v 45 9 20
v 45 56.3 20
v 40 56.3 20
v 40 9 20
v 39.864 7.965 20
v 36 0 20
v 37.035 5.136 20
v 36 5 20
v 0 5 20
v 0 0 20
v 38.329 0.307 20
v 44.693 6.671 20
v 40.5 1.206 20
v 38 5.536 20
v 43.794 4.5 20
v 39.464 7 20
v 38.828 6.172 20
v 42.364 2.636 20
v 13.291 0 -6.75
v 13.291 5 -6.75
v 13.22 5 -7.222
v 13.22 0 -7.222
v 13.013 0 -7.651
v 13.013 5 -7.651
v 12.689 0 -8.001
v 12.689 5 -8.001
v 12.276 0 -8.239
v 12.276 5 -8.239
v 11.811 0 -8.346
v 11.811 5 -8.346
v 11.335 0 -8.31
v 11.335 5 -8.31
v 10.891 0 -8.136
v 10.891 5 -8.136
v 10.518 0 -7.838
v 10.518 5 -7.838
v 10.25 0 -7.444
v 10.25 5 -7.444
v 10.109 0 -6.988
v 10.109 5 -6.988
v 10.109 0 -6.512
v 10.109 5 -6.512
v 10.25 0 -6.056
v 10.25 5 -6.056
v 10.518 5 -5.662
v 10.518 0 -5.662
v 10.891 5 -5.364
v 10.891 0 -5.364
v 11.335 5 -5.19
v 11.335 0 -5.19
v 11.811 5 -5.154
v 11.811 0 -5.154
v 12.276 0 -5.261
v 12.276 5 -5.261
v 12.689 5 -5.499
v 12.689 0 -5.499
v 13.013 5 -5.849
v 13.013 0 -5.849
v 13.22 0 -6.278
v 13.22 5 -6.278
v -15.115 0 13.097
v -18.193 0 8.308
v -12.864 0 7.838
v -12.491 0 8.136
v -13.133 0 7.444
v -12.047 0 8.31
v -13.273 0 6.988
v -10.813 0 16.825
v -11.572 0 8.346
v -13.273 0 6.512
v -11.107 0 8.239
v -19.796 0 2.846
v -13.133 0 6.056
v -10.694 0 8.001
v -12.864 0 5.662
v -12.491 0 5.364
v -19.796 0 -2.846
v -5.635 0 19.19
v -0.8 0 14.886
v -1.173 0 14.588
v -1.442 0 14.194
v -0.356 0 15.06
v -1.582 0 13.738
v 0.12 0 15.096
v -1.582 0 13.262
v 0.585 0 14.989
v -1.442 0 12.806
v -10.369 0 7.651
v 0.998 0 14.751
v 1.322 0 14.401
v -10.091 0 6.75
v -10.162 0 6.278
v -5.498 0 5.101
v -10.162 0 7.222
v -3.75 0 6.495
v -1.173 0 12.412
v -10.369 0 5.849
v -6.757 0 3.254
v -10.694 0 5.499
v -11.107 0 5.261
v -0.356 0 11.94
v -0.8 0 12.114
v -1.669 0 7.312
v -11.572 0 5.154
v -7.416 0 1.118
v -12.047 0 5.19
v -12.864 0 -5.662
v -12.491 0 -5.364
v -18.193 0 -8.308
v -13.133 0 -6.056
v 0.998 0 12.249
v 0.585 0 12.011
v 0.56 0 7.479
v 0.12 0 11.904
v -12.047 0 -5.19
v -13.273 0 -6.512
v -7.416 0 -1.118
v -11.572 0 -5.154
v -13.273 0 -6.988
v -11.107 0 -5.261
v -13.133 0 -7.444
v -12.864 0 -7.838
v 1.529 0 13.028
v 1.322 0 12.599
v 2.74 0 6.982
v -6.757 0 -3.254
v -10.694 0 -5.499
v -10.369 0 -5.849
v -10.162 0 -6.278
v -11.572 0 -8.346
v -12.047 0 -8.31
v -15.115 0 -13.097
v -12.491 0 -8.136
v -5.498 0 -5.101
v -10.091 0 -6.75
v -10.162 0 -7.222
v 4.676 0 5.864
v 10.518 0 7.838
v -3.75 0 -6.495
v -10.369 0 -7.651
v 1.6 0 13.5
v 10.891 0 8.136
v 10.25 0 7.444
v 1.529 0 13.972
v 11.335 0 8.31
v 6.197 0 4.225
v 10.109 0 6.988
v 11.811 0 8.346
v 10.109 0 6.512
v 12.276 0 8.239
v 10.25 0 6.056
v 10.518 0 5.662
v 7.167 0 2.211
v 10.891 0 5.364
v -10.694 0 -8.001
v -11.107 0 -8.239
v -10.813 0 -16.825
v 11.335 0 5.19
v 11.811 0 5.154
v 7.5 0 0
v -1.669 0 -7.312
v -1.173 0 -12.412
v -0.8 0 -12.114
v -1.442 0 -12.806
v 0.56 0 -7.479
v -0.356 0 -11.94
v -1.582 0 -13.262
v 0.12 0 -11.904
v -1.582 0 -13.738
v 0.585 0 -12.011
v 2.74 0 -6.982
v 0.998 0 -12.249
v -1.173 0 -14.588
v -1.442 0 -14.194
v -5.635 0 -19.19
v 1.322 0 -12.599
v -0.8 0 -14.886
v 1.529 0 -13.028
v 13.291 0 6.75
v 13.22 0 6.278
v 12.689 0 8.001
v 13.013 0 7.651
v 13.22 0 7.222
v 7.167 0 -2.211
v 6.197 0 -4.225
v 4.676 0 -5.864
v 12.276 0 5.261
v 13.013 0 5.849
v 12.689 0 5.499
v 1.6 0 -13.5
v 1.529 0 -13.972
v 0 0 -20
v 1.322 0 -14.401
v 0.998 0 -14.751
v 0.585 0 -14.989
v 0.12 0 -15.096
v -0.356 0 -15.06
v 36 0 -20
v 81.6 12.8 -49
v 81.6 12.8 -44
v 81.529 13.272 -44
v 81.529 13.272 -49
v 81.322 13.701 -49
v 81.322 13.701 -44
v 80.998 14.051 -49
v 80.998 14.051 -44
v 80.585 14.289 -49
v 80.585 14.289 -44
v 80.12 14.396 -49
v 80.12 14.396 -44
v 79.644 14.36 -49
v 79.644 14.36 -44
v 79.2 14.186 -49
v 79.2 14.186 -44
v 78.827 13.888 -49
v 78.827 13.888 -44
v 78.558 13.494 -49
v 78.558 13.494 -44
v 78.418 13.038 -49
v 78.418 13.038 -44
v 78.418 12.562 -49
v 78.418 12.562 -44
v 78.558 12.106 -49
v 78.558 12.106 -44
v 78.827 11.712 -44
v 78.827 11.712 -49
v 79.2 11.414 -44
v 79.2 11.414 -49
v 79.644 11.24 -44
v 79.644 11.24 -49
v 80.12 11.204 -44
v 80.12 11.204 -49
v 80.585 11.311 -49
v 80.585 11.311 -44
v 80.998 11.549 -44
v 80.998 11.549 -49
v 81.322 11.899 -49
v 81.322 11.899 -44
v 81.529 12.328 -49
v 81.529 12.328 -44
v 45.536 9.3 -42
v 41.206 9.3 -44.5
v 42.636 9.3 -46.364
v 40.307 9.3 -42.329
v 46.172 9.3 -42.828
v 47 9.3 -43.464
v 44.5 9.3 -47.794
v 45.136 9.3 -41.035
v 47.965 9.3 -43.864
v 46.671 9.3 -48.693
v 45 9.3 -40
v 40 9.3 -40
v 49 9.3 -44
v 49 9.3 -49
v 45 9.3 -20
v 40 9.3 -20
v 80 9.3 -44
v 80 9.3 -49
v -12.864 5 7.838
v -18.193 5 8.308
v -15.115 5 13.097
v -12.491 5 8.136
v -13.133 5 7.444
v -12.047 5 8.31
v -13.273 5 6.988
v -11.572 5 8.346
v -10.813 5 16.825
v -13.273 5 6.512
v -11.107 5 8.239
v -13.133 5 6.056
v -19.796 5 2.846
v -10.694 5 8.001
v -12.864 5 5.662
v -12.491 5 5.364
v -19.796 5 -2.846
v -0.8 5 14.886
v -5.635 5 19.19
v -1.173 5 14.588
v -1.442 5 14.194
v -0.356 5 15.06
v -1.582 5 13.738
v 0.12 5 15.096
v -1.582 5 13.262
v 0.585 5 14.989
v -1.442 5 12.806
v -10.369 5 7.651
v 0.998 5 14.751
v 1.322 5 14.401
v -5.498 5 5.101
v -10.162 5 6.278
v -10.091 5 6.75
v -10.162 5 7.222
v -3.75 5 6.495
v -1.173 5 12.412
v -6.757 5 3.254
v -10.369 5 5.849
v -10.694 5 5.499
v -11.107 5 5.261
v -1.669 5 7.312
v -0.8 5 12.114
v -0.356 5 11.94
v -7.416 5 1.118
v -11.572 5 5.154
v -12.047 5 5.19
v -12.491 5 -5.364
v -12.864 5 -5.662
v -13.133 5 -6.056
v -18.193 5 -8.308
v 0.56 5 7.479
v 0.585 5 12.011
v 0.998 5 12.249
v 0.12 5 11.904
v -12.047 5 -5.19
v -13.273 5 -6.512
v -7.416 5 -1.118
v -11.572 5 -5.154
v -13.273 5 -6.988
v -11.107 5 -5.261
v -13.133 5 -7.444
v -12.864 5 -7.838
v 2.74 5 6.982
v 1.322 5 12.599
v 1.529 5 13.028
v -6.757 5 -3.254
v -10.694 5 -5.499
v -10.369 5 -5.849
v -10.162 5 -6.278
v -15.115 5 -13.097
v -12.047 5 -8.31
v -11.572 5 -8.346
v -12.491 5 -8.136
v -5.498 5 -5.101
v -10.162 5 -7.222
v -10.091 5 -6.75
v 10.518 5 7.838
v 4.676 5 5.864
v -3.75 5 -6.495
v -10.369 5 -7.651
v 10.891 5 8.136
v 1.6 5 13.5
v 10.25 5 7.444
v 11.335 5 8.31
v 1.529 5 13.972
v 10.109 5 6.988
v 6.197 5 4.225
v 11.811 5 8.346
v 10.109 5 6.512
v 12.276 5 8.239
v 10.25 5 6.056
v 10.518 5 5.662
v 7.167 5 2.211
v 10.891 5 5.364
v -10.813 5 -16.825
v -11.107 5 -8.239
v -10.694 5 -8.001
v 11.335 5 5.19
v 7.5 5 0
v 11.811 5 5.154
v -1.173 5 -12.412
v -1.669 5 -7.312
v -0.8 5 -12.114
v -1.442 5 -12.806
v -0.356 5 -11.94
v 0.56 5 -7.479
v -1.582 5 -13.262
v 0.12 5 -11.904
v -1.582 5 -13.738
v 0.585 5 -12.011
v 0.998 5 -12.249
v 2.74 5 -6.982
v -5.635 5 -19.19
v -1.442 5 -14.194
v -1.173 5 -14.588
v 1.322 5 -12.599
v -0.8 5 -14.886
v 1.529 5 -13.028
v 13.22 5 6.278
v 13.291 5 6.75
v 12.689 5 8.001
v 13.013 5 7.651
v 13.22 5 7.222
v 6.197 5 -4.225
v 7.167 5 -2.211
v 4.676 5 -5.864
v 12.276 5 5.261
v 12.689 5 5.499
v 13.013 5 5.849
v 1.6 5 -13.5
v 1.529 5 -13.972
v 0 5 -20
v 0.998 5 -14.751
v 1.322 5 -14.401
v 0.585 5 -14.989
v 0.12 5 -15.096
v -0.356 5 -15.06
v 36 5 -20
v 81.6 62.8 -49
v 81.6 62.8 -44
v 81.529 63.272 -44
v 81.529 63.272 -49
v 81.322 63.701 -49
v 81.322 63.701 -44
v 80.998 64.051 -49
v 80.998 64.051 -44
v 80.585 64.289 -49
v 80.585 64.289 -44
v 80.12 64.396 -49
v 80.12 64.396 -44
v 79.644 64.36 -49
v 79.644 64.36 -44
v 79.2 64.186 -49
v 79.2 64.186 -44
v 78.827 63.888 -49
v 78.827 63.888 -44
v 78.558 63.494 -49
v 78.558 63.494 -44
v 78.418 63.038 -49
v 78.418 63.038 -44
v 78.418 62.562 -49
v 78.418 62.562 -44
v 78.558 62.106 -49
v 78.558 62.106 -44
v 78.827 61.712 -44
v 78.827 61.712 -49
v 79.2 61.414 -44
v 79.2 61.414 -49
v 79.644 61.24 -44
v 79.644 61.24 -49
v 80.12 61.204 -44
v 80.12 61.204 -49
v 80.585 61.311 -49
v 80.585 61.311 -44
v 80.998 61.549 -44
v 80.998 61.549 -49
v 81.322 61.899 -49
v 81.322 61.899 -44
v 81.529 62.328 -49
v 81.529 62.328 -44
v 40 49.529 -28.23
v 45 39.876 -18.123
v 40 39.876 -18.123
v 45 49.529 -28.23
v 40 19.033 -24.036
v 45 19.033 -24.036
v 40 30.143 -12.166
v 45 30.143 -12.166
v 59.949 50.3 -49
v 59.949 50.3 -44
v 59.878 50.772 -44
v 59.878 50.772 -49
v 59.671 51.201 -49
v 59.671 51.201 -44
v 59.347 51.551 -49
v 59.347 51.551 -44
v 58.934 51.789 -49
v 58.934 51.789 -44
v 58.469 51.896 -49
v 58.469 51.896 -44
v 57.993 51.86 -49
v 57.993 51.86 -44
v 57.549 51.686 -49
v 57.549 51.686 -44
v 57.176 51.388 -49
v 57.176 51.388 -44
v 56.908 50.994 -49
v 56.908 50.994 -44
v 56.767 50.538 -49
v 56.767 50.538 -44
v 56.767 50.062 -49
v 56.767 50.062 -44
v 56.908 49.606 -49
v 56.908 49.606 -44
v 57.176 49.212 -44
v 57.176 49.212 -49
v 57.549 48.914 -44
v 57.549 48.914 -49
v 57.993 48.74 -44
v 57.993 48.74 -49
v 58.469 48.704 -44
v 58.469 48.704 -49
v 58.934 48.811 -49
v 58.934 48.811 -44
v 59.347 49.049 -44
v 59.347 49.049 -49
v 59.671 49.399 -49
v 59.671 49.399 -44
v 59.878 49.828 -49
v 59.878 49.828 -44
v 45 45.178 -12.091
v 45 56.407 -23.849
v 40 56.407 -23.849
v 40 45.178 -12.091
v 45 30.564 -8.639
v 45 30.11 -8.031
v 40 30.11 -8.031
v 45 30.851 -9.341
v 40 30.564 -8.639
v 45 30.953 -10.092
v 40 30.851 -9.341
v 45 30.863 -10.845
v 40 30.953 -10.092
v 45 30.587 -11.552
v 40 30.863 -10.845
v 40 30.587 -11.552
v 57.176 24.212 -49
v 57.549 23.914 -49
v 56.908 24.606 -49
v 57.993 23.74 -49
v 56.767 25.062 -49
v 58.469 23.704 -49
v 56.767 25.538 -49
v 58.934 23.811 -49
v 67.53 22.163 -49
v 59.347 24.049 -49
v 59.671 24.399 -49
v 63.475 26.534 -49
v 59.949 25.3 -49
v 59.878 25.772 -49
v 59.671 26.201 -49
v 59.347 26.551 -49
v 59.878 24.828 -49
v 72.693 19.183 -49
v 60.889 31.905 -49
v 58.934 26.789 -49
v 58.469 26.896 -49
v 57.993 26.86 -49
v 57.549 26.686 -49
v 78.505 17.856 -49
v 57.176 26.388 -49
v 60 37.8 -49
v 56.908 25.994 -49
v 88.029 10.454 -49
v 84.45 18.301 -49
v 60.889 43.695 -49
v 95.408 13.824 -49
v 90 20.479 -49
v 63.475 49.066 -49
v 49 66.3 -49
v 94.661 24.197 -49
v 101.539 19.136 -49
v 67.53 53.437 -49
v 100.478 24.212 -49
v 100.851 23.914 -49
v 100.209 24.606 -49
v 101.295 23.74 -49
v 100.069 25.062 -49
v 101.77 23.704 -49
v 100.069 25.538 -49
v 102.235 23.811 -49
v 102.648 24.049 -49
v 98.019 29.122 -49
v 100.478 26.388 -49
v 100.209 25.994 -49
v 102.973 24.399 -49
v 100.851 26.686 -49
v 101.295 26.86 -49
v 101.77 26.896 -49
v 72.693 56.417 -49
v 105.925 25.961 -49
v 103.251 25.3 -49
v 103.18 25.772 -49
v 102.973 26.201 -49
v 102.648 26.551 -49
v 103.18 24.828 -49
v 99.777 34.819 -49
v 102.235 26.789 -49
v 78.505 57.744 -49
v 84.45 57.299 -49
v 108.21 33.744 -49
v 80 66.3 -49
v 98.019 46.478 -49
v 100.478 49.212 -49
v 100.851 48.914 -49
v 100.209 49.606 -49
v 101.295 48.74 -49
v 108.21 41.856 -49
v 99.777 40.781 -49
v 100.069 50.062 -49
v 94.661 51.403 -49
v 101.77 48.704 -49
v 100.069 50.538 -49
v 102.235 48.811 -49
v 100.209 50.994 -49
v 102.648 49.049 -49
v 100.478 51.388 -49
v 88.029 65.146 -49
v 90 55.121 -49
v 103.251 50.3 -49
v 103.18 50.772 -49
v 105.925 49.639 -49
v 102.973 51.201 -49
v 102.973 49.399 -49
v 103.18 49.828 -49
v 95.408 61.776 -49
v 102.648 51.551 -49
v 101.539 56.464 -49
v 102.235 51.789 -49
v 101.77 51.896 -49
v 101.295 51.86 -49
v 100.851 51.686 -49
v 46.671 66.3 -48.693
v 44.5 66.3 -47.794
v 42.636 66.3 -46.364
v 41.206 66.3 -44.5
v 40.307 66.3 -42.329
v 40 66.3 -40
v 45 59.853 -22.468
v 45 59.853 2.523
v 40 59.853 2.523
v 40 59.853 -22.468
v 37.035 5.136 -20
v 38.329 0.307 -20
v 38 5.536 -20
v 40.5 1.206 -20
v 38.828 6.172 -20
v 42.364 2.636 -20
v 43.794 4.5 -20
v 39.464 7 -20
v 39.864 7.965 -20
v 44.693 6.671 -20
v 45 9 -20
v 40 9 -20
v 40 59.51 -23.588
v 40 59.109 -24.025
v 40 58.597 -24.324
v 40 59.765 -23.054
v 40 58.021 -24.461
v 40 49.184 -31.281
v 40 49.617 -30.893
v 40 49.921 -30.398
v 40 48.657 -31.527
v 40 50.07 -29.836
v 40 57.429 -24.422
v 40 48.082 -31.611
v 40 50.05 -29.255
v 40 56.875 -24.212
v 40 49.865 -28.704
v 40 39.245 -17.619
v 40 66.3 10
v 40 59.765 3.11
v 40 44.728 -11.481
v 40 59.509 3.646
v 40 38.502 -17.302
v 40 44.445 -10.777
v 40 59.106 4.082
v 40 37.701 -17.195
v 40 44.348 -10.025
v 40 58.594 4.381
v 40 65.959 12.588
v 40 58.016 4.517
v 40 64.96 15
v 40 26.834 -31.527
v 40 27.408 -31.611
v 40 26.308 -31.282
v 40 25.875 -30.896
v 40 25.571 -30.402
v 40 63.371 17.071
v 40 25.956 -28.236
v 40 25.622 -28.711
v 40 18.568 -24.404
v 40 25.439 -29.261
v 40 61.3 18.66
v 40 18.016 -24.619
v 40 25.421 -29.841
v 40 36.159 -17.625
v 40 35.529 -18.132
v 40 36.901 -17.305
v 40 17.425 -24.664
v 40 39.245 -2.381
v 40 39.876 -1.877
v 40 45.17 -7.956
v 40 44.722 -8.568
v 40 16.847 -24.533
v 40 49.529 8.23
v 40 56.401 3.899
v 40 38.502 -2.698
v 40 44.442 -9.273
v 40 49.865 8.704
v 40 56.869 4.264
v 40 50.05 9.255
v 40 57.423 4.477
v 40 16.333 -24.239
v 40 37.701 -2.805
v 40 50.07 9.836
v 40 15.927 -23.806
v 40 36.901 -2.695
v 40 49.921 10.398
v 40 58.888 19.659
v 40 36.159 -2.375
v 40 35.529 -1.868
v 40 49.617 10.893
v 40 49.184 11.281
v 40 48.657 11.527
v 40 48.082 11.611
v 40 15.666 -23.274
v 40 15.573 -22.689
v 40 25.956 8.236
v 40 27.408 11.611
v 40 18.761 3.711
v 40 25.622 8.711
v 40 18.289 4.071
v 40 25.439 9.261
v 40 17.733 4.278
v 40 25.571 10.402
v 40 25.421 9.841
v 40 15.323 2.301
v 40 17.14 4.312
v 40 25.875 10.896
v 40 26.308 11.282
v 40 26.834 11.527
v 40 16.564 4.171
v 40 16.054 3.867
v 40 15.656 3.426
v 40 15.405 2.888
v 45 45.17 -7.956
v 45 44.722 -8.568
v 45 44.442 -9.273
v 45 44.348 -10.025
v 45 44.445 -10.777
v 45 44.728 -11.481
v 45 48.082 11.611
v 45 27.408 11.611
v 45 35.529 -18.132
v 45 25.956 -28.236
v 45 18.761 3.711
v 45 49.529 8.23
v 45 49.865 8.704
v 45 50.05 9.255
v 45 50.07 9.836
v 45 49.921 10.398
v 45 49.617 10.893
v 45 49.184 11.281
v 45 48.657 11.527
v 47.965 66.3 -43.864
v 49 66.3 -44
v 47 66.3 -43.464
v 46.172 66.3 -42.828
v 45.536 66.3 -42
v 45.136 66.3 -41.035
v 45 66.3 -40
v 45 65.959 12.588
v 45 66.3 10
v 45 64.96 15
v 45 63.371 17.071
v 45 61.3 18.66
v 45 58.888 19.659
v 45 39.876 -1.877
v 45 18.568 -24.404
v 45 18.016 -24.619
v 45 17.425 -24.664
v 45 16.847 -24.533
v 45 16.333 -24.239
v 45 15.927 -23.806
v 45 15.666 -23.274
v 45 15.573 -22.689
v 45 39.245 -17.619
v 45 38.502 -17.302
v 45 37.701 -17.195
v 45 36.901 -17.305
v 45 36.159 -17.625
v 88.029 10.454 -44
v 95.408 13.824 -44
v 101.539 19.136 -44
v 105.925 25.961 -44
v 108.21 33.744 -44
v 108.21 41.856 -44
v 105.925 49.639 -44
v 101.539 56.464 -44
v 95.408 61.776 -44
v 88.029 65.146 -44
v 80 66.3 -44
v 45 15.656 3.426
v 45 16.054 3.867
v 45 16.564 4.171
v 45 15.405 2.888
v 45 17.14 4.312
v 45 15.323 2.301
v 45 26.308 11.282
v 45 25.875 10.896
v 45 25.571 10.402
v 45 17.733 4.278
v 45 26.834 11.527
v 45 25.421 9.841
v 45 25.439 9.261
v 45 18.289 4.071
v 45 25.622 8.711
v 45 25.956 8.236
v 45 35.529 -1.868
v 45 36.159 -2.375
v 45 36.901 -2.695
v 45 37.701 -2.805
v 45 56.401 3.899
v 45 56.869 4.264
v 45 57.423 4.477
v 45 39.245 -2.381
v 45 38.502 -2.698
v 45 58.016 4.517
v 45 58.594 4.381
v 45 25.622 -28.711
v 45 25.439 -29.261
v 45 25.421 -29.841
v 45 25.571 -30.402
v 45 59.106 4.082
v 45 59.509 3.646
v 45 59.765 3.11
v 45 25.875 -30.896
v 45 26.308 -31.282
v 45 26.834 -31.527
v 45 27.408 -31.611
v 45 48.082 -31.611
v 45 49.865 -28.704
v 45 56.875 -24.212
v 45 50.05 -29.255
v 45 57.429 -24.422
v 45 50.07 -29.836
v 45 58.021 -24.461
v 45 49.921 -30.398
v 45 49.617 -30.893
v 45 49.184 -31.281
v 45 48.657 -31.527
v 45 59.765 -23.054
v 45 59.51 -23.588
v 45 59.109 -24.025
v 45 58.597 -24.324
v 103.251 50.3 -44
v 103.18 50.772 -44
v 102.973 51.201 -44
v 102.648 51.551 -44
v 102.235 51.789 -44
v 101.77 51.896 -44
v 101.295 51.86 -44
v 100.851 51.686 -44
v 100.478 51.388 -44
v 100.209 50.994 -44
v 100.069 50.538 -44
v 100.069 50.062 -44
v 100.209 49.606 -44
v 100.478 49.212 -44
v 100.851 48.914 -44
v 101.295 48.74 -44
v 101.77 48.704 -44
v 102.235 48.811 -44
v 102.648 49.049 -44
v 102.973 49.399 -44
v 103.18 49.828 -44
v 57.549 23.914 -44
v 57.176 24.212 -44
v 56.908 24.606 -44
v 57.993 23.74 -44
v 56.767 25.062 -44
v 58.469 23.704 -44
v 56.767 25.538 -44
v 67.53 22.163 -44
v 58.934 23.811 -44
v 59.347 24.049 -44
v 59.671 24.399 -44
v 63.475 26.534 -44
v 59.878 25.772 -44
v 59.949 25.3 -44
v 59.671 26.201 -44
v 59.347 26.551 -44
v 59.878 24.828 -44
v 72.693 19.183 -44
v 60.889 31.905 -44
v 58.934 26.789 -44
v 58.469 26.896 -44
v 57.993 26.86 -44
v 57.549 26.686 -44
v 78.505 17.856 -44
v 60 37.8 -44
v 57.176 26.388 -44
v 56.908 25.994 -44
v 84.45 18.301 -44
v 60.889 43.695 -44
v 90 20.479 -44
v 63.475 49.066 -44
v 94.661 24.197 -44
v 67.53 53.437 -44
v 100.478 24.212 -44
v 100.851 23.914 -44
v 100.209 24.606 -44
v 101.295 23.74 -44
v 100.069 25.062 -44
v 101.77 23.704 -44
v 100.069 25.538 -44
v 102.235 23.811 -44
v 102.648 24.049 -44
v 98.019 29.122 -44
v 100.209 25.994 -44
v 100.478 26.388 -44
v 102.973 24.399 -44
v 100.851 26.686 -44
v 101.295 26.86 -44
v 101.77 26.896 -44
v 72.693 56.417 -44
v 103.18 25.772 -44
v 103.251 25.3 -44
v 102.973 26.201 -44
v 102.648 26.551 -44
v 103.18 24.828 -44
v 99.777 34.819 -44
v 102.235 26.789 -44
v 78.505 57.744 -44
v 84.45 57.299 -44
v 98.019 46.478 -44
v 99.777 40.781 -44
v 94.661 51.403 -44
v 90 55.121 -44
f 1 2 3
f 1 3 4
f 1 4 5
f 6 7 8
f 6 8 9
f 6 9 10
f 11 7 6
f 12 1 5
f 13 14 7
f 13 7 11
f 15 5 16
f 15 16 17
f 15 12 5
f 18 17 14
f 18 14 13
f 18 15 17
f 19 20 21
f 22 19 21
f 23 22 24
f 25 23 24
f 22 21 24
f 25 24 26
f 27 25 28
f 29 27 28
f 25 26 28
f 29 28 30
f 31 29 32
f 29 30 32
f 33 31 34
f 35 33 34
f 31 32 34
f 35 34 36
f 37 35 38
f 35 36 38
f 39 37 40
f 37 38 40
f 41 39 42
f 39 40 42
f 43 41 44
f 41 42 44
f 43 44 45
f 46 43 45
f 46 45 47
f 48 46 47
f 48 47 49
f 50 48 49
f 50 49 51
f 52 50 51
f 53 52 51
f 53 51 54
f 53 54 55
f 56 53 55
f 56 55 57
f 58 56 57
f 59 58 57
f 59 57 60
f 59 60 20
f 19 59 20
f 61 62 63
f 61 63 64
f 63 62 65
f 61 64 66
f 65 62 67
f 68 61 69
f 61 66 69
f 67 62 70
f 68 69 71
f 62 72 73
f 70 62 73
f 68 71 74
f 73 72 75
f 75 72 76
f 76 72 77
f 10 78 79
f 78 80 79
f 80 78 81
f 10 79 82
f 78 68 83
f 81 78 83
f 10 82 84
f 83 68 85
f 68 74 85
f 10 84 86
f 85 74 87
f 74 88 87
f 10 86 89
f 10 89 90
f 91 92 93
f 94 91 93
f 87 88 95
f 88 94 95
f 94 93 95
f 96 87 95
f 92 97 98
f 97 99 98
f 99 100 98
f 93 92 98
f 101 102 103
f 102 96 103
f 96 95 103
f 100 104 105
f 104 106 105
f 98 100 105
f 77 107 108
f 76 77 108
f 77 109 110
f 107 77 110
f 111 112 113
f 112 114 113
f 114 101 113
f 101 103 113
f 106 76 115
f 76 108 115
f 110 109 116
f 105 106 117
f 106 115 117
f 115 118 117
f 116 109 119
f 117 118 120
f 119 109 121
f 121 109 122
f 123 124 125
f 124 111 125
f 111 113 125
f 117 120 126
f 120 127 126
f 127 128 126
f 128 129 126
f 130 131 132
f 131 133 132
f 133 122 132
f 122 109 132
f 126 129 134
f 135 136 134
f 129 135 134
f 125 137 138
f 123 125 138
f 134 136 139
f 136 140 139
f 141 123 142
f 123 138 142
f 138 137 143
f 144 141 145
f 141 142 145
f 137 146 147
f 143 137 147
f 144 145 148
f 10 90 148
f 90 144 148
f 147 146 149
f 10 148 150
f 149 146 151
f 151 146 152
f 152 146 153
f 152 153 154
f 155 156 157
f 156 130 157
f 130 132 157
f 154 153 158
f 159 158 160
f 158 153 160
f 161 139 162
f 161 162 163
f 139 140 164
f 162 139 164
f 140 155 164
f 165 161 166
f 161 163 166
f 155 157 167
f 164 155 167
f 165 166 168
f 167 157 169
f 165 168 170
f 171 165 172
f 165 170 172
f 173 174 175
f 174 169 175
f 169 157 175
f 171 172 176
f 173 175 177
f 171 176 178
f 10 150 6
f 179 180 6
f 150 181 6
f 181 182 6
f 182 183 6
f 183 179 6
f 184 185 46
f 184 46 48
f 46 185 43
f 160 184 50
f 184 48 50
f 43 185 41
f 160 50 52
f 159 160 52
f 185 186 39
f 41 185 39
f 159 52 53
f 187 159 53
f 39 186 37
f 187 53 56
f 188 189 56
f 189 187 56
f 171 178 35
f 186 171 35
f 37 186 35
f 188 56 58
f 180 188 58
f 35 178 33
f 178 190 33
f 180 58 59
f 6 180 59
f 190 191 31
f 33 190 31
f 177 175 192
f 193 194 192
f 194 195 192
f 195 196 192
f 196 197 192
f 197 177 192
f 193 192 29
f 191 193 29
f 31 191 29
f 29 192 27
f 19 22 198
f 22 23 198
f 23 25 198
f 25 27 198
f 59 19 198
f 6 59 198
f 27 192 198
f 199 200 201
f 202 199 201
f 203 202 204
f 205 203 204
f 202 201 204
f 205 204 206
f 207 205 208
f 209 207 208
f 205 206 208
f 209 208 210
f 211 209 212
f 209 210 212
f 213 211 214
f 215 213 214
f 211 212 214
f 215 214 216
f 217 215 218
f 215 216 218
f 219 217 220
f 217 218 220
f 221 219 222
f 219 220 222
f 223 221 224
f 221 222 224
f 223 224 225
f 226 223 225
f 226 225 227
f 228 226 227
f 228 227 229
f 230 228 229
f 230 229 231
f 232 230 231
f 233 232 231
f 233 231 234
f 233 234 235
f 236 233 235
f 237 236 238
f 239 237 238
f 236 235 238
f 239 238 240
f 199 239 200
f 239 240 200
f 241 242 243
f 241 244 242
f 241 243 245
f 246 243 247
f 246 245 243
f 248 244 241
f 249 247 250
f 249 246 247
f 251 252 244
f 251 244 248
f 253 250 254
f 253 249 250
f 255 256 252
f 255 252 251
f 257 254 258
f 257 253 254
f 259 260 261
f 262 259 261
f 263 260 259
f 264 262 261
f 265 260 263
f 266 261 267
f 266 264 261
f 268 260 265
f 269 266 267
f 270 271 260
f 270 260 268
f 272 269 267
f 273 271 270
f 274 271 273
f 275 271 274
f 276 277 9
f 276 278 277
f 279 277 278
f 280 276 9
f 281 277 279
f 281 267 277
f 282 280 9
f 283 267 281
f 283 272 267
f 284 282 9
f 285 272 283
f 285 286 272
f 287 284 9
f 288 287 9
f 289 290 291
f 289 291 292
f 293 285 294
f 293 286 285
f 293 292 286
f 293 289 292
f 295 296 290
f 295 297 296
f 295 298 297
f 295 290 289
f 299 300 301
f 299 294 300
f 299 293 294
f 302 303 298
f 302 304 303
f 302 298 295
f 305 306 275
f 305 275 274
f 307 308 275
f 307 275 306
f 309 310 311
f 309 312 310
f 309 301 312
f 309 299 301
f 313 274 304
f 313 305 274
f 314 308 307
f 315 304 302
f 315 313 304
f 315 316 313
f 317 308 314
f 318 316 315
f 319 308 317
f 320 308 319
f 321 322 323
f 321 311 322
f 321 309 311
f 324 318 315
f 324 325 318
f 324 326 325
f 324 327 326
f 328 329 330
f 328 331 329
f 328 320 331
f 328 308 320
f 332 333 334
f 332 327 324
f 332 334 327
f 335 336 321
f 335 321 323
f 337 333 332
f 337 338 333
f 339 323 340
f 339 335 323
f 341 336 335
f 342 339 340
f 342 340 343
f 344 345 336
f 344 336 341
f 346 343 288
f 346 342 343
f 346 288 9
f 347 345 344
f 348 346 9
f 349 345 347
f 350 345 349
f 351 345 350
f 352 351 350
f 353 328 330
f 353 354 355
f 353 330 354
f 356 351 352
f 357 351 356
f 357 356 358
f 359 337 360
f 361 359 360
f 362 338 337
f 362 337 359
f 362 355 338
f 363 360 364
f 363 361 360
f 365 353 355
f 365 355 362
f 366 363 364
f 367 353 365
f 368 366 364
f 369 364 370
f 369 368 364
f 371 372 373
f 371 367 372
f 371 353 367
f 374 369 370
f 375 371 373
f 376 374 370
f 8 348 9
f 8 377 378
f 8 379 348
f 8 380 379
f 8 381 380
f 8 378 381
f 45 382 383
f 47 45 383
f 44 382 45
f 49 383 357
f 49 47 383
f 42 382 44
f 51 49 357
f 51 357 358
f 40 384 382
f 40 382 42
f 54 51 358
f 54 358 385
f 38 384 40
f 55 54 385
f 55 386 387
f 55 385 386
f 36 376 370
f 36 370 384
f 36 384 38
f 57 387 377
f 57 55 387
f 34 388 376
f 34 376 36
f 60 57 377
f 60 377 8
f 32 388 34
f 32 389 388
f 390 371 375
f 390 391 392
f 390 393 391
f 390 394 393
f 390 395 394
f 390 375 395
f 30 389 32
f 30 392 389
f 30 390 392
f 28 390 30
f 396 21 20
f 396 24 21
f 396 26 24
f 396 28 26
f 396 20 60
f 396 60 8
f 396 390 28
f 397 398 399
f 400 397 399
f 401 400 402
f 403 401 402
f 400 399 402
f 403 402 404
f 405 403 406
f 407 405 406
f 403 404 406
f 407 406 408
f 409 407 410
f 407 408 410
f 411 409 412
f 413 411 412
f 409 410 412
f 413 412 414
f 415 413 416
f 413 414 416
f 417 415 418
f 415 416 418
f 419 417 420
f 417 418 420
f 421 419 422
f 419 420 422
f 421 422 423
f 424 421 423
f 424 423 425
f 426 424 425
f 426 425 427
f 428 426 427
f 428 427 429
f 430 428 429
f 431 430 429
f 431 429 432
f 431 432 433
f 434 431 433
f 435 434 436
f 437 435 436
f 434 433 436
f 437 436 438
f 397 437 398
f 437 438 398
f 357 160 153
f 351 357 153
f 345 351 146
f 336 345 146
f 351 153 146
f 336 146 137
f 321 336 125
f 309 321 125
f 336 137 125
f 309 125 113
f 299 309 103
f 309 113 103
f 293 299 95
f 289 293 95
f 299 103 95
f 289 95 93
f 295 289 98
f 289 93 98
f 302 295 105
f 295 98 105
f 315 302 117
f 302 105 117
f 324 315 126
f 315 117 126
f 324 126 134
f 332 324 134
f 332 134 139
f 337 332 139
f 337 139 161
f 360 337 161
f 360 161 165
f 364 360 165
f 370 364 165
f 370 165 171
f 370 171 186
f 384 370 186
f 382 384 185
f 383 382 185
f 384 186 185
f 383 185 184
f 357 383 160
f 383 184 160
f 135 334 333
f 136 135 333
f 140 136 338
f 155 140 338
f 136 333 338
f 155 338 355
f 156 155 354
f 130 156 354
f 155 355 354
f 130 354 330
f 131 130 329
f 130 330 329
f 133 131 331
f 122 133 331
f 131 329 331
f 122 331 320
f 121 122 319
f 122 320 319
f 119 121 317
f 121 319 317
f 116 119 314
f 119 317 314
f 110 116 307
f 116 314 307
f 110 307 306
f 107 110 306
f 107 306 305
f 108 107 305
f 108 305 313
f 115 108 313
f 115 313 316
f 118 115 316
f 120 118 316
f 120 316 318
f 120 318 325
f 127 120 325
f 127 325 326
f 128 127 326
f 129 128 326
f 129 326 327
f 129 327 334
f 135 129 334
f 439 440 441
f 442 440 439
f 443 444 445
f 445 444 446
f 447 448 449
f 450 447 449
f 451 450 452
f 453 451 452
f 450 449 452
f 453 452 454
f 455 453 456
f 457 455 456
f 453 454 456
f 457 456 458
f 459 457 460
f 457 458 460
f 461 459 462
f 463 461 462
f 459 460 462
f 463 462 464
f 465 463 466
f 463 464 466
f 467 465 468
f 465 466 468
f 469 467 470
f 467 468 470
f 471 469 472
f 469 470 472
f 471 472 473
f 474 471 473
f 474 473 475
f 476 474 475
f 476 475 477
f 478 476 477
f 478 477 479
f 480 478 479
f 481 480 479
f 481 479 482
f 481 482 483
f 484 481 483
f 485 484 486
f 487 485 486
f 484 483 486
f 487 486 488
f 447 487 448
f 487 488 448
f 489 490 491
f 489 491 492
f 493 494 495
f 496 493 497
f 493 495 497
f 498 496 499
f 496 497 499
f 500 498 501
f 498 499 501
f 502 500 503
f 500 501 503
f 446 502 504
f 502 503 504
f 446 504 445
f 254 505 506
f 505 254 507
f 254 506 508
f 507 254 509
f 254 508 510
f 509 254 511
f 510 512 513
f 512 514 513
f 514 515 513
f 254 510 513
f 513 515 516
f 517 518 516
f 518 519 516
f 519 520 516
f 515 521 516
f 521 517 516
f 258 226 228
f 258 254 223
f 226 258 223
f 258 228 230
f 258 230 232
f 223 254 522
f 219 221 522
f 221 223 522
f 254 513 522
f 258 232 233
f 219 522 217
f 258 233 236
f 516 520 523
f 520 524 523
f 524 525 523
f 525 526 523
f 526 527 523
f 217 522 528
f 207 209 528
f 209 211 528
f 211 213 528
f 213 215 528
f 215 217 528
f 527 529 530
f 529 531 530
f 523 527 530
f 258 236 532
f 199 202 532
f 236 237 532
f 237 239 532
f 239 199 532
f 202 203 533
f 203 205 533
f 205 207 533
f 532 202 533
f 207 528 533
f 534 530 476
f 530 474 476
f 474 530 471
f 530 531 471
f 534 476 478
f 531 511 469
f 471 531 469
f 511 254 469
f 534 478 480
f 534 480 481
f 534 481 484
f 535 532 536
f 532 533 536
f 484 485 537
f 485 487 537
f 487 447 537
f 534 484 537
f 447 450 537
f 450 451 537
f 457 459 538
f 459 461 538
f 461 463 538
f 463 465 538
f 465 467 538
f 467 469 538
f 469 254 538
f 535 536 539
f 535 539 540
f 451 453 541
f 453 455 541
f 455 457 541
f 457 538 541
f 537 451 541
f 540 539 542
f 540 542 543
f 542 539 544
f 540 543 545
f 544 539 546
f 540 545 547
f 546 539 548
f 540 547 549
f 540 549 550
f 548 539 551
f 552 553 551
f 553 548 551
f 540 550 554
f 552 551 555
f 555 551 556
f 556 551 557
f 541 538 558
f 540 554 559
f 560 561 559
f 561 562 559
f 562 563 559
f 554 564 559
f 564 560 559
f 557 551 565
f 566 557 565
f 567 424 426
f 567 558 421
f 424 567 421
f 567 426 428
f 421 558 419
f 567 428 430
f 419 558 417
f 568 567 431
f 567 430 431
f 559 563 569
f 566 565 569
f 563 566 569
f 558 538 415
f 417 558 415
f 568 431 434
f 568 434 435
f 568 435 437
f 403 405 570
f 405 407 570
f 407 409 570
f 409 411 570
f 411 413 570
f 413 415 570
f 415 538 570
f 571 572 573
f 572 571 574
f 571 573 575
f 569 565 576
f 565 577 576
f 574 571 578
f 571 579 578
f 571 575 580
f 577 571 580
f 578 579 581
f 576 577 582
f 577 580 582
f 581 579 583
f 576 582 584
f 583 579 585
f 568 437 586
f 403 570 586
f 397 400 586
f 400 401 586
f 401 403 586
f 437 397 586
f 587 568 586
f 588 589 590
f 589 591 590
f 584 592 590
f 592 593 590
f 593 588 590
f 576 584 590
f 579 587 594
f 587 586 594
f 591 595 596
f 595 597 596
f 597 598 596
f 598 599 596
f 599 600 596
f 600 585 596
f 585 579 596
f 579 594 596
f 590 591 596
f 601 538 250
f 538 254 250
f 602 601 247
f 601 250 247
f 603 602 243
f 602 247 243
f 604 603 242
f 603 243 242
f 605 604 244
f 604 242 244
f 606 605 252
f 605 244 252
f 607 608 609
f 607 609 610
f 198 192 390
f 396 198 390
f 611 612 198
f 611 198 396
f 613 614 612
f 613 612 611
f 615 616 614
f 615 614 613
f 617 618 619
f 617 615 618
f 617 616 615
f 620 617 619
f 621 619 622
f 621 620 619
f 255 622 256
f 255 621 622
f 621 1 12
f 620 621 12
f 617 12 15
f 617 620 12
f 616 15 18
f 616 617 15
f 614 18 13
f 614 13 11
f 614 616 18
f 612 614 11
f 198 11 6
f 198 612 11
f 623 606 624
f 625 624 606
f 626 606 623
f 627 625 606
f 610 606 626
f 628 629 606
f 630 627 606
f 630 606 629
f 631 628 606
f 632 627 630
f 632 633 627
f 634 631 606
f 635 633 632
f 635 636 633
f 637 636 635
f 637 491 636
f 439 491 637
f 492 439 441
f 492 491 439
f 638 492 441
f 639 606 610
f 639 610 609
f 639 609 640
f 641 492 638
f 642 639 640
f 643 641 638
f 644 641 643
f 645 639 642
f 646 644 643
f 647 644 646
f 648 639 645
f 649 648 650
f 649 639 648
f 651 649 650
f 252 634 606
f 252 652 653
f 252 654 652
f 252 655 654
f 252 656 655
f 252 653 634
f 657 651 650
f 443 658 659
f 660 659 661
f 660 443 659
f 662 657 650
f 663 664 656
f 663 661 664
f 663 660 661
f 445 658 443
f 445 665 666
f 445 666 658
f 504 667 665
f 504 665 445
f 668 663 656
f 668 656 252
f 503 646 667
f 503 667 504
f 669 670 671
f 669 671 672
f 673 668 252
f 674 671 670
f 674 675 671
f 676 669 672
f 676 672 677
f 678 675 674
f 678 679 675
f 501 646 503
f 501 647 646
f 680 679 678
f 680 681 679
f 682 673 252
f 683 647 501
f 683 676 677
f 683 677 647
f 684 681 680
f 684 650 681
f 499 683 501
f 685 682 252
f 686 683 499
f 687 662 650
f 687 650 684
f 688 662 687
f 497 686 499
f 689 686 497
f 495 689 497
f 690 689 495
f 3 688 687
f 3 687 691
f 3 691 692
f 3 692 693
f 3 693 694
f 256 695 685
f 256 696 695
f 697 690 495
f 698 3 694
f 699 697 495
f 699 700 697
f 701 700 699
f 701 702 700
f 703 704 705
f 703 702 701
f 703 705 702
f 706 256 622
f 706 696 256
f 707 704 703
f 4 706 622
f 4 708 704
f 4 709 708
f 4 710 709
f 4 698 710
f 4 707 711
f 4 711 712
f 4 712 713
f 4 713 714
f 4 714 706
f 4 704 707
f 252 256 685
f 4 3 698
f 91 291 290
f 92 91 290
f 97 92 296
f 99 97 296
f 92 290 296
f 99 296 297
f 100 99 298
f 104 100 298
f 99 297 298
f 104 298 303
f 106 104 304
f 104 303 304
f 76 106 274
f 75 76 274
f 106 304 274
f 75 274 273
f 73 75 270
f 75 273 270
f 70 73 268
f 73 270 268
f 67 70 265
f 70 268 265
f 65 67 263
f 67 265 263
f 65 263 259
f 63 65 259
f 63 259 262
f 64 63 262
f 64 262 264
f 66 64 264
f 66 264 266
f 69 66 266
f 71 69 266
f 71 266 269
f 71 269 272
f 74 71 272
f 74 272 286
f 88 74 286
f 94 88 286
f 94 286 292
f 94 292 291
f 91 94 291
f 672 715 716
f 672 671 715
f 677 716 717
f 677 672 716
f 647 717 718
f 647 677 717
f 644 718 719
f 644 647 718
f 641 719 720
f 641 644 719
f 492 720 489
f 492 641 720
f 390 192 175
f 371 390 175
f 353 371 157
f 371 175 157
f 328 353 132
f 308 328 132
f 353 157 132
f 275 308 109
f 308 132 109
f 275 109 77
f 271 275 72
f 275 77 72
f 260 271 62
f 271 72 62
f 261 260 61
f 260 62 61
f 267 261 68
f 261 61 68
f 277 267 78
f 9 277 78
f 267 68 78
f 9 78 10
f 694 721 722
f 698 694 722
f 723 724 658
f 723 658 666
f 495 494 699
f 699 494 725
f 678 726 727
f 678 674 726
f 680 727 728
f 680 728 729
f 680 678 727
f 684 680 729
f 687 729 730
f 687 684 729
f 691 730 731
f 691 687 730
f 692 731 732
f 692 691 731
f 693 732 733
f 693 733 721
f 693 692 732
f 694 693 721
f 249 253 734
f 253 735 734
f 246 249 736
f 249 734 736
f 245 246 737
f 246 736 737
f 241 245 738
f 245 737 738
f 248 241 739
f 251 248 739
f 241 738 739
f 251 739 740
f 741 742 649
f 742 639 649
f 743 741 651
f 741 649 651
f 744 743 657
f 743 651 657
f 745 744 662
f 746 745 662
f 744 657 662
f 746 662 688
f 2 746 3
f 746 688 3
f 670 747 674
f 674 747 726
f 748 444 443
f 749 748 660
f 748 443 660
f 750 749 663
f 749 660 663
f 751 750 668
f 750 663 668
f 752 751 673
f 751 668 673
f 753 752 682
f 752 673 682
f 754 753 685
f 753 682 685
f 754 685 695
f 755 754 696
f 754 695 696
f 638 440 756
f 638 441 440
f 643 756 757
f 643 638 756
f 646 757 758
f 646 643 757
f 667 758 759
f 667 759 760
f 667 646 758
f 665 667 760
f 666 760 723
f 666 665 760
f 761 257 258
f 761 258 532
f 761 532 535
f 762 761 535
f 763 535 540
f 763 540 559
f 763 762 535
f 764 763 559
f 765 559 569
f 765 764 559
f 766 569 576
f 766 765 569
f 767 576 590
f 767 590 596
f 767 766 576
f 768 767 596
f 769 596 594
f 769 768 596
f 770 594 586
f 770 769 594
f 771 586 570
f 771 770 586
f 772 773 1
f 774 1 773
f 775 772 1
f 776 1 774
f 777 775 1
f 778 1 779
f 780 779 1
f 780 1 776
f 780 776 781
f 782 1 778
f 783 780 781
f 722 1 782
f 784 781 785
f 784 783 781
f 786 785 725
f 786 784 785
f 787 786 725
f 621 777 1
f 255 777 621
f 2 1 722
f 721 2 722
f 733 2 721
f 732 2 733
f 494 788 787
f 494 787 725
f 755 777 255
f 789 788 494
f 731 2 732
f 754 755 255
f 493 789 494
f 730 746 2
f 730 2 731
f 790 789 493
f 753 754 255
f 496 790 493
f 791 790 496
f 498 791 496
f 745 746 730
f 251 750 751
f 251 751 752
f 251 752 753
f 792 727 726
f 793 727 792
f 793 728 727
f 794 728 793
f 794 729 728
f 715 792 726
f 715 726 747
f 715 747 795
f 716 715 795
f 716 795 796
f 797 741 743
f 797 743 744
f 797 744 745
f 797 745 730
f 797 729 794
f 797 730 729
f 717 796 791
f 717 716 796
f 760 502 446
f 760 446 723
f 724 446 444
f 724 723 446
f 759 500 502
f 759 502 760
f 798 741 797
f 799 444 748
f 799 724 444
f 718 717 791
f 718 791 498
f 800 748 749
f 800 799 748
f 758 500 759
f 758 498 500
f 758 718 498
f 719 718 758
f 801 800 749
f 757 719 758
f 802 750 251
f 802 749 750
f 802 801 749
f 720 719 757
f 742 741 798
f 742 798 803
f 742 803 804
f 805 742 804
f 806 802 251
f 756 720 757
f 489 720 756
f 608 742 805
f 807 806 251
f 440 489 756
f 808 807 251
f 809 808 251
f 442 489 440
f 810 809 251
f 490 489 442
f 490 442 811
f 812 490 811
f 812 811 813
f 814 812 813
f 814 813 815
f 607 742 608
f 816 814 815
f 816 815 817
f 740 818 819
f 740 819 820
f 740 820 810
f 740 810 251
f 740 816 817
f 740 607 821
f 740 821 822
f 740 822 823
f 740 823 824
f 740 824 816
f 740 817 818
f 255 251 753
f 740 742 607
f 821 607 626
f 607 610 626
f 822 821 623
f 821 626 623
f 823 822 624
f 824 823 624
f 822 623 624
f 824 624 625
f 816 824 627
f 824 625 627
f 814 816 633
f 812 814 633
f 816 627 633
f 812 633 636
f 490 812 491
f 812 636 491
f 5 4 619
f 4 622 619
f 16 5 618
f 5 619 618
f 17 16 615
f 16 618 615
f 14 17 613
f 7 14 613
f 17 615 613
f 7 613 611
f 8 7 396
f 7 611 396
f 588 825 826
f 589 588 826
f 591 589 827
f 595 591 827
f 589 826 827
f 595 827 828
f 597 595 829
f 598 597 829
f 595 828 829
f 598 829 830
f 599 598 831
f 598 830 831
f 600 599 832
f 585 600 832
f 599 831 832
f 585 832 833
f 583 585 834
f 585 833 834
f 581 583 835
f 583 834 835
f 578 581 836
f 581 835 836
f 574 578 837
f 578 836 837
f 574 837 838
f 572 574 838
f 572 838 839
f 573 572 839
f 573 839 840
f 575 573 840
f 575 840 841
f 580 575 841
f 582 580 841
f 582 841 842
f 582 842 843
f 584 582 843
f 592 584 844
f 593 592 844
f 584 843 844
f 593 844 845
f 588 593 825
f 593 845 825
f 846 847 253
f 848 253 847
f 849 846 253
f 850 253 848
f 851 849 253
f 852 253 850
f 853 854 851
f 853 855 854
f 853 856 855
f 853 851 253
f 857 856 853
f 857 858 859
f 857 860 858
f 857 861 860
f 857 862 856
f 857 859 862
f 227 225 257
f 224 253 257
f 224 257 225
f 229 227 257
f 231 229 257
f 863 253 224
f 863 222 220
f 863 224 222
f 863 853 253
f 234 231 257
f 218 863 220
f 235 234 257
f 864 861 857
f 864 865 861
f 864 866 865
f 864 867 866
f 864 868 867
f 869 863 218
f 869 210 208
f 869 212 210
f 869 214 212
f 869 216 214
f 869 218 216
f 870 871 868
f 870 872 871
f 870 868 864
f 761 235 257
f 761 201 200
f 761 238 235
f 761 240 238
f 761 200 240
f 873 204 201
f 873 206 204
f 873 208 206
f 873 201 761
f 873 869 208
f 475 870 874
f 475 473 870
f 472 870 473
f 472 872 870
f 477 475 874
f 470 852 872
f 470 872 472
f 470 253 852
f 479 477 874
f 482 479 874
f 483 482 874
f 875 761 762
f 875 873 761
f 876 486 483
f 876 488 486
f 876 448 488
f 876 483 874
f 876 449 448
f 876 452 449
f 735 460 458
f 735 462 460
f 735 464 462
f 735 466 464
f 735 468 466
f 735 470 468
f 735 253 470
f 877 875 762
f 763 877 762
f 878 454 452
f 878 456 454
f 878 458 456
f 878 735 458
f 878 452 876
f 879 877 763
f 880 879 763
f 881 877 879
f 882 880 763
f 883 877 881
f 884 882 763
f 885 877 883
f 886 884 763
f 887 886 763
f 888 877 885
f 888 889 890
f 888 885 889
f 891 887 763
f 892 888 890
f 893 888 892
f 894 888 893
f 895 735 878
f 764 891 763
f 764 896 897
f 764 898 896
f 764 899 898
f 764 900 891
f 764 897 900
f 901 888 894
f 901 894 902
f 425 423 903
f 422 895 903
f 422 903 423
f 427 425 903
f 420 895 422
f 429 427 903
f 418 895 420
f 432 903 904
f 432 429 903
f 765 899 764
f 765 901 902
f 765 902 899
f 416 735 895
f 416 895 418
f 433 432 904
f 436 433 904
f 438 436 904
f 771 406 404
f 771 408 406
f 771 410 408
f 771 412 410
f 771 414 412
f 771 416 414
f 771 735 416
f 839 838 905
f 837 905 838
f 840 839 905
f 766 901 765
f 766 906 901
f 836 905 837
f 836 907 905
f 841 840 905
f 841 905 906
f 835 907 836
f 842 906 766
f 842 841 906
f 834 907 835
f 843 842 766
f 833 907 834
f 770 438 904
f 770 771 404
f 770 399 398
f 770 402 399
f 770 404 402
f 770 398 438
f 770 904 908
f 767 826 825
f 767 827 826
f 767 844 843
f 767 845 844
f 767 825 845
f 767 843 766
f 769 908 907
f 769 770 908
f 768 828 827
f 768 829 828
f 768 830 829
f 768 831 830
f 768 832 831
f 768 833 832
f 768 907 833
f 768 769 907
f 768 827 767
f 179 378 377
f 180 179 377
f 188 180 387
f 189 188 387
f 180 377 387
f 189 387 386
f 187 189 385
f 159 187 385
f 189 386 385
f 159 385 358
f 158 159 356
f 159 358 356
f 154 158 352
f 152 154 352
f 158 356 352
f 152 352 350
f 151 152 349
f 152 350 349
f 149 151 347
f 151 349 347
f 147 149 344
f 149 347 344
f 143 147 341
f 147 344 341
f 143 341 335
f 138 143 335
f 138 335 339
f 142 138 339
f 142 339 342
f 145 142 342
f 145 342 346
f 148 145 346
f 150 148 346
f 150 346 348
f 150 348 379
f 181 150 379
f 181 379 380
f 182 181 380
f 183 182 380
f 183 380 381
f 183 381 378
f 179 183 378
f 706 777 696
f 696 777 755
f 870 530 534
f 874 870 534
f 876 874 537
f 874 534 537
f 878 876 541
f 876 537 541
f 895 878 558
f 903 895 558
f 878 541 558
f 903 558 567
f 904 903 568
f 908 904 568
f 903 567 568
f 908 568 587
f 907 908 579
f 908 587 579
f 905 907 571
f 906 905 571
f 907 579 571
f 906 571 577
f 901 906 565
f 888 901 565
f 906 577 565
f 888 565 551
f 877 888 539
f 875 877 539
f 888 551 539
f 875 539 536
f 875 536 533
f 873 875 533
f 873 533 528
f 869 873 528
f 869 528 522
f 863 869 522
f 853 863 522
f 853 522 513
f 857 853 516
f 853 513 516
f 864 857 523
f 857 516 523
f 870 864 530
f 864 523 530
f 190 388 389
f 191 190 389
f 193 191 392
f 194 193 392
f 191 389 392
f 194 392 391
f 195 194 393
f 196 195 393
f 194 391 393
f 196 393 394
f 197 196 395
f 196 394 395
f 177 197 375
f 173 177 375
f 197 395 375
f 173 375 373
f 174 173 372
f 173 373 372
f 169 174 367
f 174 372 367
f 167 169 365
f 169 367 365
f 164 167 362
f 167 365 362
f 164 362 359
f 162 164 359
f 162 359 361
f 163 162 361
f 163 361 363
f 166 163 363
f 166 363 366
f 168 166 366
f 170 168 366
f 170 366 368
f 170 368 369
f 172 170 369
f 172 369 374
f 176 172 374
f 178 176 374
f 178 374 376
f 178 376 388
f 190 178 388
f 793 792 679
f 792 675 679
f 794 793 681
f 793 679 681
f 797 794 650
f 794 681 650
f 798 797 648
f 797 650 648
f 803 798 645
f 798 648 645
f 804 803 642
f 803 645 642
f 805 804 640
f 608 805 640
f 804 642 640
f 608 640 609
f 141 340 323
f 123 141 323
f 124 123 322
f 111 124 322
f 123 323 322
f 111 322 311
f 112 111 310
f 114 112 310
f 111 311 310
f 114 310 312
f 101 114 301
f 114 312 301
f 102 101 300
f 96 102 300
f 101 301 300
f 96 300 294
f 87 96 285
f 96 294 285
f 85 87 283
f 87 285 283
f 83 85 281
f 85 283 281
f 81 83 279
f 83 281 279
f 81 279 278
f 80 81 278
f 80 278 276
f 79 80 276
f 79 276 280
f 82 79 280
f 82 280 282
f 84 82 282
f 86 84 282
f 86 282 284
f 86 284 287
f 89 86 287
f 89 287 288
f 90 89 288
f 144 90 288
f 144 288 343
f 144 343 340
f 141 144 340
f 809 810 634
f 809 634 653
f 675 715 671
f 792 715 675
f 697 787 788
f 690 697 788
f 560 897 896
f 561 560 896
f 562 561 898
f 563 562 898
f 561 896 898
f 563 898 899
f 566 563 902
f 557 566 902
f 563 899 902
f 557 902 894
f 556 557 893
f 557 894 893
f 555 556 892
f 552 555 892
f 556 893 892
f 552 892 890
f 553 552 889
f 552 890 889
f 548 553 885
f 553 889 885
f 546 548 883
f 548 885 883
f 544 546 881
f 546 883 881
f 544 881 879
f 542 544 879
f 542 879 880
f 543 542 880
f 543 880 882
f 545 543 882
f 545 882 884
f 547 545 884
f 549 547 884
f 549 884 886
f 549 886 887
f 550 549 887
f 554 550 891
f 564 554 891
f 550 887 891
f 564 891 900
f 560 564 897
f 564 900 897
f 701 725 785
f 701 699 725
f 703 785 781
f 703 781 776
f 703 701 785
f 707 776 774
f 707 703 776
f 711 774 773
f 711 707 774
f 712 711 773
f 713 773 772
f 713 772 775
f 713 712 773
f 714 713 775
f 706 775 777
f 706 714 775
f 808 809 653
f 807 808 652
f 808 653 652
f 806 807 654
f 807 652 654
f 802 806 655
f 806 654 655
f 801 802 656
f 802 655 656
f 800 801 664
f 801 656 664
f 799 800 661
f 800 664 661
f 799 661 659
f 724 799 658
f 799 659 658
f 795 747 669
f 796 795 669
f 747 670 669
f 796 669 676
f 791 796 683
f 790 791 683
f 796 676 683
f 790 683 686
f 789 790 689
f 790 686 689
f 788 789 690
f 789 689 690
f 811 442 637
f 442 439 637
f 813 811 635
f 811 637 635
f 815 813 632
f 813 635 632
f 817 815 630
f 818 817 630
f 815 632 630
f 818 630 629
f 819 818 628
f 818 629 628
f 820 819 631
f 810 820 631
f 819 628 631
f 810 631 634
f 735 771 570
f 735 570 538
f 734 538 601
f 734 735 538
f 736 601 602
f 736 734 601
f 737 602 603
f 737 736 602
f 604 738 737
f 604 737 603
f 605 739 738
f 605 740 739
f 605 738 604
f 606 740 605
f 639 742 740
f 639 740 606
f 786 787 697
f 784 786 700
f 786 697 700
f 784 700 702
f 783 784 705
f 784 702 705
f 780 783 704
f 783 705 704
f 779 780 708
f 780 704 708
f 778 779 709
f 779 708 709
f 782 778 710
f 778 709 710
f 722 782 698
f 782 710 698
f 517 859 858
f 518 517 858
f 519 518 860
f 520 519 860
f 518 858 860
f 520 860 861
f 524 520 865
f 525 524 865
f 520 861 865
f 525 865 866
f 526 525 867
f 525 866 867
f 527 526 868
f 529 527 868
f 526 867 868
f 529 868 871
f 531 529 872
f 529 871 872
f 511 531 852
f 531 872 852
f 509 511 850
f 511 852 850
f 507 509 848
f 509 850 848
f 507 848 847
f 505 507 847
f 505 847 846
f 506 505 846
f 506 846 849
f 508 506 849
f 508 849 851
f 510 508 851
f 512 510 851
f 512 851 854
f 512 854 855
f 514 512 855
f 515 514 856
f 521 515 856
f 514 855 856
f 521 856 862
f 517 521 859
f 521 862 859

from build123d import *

# Parameters (mm, degrees)
EXTRUDE_1_DEPTH     = 5
SKETCH_3_R          = 1.6
CUT_EXTRUDE_1_DEPTH = 11
EXTRUDE_3_DEPTH     = 5
EXTRUDE_4_DEPTH     = 5
SKETCH_25_R         = 20
CUT_EXTRUDE_2_DEPTH = 5
FILLET_1_R          = 4
FILLET_4_R          = 9
SKETCH_19_R         = 7.5
CUT_EXTRUDE_3_DEPTH = 5
SKETCH_26_R         = 1.6
CUT_EXTRUDE_4_DEPTH = 5
FILLET_5_R          = 10
CUT_EXTRUDE_5_DEPTH = 5
FILLET_10_R         = 2
FILLET_11_R         = 3


with BuildPart() as part:
    # 草图1 → 凸台-拉伸1 (new body)
    with BuildSketch(Plane(origin=(0, 0, 0), x_dir=(1, 0, 0), z_dir=(0, 1, 0))):
        with BuildLine():
            Line((45, 20), (0, 20))
            ThreePointArc((0, 20), (-20, 0), (0, -20))
            Line((0, -20), (45, -20))
            Line((45, -20), (45, 20))
        make_face()
    extrude(amount=EXTRUDE_1_DEPTH)

    # 草图3 → 切除-拉伸1 (cut)
    with BuildSketch(Plane(origin=(0, 5, 0), x_dir=(1, 0, 0), z_dir=(0, 1, 0))):
        with Locations((0, 13.5)):
            Circle(SKETCH_3_R)
        with Locations((11.691342951, 6.75)):
            Circle(SKETCH_3_R)
        with Locations((11.691342951, -6.75)):
            Circle(SKETCH_3_R)
        with Locations((0, -13.5)):
            Circle(SKETCH_3_R)
        with Locations((-11.691342951, -6.75)):
            Circle(SKETCH_3_R)
        with Locations((-11.691342951, 6.75)):
            Circle(SKETCH_3_R)
    extrude(amount=-CUT_EXTRUDE_1_DEPTH, mode=Mode.SUBTRACT)

    # 草图22 → 凸台-拉伸3 (add)
    with BuildSketch(Plane(origin=(45, 0, 0), x_dir=(0, 0, -1), z_dir=(1, 0, 0))):
        Polygon((-20, 5), (20, 5), (20, 9.3), (44, 9.3), (44, 66.3), (-20, 66.3), align=None)
    extrude(amount=-EXTRUDE_3_DEPTH)

    # 草图24 → 凸台-拉伸4 (add)
    with BuildSketch(Plane(origin=(0, 0, -44), x_dir=(-1, 0, 0), z_dir=(0, 0, -1))):
        with BuildLine():
            Line((-40, 9.3), (-80, 9.3))
            ThreePointArc((-80, 9.3), (-108.5, 37.8), (-80, 66.3))
            Line((-80, 66.3), (-40, 66.3))
            Line((-40, 66.3), (-40, 9.3))
        make_face()
    extrude(amount=EXTRUDE_4_DEPTH)

    # 草图25 → 切除-拉伸2 (cut)
    with BuildSketch(Plane(origin=(0, 0, -49), x_dir=(-1, 0, 0), z_dir=(0, 0, -1))):
        with Locations((-80, 37.8)):
            Circle(SKETCH_25_R)
    extrude(amount=-CUT_EXTRUDE_2_DEPTH, mode=Mode.SUBTRACT)

    # 圆角1
    fillet_1_edges = [part.edges().sort_by_distance(p)[0] for p in [
        (40, 5, 0),
        (45, 37.8, -44),
    ]]
    fillet(fillet_1_edges, radius=FILLET_1_R)

    # 圆角4
    fillet_4_edges = [part.edges().sort_by_distance(p)[0] for p in [
        (45, 0, 0),
        (40, 37.8, -49),
    ]]
    fillet(fillet_4_edges, radius=FILLET_4_R)

    # 草图19 → 切除-拉伸3 (cut)
    with BuildSketch(Plane.XZ):
        Circle(SKETCH_19_R)
    extrude(amount=-CUT_EXTRUDE_3_DEPTH, mode=Mode.SUBTRACT)

    # 草图26 → 切除-拉伸4 (cut)
    with BuildSketch(Plane.XY.offset(-44)):
        with Locations((101.650635095, 50.3)):
            Circle(SKETCH_26_R)
        with Locations((101.650635095, 25.3)):
            Circle(SKETCH_26_R)
        with Locations((80, 12.8)):
            Circle(SKETCH_26_R)
        with Locations((58.349364905, 25.3)):
            Circle(SKETCH_26_R)
        with Locations((58.349364905, 50.3)):
            Circle(SKETCH_26_R)
        with Locations((80, 62.8)):
            Circle(SKETCH_26_R)
    extrude(amount=-CUT_EXTRUDE_4_DEPTH, mode=Mode.SUBTRACT)

    # 圆角5
    fillet_5_edges = [part.edges().sort_by_distance(p)[0] for p in [
        (42.5, 66.3, 20),
    ]]
    fillet(fillet_5_edges, radius=FILLET_5_R)

    # 草图27 → 切除-拉伸5 (cut)
    with BuildSketch(Plane(origin=(45, 0, 0), x_dir=(0, 0, -1), z_dir=(1, 0, 0))):
        Polygon((10.027417726, 43.207223614), (-7.542180321, 59.853257478), (27.457819679, 59.853257478), align=None)
        Polygon((15.84211595, 37.698181047), (31.611388693, 52.757836516), (31.611388693, 22.757836516), align=None)
        Polygon((-7.31927621, 15.272435239), (27.678973834, 15.622426489), (10.082987202, 32.093328411), align=None)
        Polygon((-11.611388693, 52.757836516), (-11.611388693, 22.757836516), (4.15788405, 37.698181047), align=None)
    extrude(amount=-CUT_EXTRUDE_5_DEPTH, mode=Mode.SUBTRACT)

    # 圆角10
    fillet_10_edges = [part.edges().sort_by_distance(p)[0] for p in [
        (42.5, 15.272435239, 7.31927621),
        (42.5, 15.622426489, -27.678973834),
        (42.5, 22.757836516, -31.611388693),
        (42.5, 52.757836516, -31.611388693),
        (42.5, 52.757836516, 11.611388693),
        (42.5, 22.757836516, 11.611388693),
        (42.5, 59.853257478, -27.457819679),
        (42.5, 59.853257478, 7.542180321),
    ]]
    fillet(fillet_10_edges, radius=FILLET_10_R)

    # 圆角11
    fillet_11_edges = [part.edges().sort_by_distance(p)[0] for p in [
        (42.5, 32.093328411, -10.082987202),
        (42.5, 37.698181047, -15.84211595),
        (42.5, 37.698181047, -4.15788405),
        (42.5, 43.207223614, -10.027417726),
    ]]
    fillet(fillet_11_edges, radius=FILLET_11_R)


solid = part.part
